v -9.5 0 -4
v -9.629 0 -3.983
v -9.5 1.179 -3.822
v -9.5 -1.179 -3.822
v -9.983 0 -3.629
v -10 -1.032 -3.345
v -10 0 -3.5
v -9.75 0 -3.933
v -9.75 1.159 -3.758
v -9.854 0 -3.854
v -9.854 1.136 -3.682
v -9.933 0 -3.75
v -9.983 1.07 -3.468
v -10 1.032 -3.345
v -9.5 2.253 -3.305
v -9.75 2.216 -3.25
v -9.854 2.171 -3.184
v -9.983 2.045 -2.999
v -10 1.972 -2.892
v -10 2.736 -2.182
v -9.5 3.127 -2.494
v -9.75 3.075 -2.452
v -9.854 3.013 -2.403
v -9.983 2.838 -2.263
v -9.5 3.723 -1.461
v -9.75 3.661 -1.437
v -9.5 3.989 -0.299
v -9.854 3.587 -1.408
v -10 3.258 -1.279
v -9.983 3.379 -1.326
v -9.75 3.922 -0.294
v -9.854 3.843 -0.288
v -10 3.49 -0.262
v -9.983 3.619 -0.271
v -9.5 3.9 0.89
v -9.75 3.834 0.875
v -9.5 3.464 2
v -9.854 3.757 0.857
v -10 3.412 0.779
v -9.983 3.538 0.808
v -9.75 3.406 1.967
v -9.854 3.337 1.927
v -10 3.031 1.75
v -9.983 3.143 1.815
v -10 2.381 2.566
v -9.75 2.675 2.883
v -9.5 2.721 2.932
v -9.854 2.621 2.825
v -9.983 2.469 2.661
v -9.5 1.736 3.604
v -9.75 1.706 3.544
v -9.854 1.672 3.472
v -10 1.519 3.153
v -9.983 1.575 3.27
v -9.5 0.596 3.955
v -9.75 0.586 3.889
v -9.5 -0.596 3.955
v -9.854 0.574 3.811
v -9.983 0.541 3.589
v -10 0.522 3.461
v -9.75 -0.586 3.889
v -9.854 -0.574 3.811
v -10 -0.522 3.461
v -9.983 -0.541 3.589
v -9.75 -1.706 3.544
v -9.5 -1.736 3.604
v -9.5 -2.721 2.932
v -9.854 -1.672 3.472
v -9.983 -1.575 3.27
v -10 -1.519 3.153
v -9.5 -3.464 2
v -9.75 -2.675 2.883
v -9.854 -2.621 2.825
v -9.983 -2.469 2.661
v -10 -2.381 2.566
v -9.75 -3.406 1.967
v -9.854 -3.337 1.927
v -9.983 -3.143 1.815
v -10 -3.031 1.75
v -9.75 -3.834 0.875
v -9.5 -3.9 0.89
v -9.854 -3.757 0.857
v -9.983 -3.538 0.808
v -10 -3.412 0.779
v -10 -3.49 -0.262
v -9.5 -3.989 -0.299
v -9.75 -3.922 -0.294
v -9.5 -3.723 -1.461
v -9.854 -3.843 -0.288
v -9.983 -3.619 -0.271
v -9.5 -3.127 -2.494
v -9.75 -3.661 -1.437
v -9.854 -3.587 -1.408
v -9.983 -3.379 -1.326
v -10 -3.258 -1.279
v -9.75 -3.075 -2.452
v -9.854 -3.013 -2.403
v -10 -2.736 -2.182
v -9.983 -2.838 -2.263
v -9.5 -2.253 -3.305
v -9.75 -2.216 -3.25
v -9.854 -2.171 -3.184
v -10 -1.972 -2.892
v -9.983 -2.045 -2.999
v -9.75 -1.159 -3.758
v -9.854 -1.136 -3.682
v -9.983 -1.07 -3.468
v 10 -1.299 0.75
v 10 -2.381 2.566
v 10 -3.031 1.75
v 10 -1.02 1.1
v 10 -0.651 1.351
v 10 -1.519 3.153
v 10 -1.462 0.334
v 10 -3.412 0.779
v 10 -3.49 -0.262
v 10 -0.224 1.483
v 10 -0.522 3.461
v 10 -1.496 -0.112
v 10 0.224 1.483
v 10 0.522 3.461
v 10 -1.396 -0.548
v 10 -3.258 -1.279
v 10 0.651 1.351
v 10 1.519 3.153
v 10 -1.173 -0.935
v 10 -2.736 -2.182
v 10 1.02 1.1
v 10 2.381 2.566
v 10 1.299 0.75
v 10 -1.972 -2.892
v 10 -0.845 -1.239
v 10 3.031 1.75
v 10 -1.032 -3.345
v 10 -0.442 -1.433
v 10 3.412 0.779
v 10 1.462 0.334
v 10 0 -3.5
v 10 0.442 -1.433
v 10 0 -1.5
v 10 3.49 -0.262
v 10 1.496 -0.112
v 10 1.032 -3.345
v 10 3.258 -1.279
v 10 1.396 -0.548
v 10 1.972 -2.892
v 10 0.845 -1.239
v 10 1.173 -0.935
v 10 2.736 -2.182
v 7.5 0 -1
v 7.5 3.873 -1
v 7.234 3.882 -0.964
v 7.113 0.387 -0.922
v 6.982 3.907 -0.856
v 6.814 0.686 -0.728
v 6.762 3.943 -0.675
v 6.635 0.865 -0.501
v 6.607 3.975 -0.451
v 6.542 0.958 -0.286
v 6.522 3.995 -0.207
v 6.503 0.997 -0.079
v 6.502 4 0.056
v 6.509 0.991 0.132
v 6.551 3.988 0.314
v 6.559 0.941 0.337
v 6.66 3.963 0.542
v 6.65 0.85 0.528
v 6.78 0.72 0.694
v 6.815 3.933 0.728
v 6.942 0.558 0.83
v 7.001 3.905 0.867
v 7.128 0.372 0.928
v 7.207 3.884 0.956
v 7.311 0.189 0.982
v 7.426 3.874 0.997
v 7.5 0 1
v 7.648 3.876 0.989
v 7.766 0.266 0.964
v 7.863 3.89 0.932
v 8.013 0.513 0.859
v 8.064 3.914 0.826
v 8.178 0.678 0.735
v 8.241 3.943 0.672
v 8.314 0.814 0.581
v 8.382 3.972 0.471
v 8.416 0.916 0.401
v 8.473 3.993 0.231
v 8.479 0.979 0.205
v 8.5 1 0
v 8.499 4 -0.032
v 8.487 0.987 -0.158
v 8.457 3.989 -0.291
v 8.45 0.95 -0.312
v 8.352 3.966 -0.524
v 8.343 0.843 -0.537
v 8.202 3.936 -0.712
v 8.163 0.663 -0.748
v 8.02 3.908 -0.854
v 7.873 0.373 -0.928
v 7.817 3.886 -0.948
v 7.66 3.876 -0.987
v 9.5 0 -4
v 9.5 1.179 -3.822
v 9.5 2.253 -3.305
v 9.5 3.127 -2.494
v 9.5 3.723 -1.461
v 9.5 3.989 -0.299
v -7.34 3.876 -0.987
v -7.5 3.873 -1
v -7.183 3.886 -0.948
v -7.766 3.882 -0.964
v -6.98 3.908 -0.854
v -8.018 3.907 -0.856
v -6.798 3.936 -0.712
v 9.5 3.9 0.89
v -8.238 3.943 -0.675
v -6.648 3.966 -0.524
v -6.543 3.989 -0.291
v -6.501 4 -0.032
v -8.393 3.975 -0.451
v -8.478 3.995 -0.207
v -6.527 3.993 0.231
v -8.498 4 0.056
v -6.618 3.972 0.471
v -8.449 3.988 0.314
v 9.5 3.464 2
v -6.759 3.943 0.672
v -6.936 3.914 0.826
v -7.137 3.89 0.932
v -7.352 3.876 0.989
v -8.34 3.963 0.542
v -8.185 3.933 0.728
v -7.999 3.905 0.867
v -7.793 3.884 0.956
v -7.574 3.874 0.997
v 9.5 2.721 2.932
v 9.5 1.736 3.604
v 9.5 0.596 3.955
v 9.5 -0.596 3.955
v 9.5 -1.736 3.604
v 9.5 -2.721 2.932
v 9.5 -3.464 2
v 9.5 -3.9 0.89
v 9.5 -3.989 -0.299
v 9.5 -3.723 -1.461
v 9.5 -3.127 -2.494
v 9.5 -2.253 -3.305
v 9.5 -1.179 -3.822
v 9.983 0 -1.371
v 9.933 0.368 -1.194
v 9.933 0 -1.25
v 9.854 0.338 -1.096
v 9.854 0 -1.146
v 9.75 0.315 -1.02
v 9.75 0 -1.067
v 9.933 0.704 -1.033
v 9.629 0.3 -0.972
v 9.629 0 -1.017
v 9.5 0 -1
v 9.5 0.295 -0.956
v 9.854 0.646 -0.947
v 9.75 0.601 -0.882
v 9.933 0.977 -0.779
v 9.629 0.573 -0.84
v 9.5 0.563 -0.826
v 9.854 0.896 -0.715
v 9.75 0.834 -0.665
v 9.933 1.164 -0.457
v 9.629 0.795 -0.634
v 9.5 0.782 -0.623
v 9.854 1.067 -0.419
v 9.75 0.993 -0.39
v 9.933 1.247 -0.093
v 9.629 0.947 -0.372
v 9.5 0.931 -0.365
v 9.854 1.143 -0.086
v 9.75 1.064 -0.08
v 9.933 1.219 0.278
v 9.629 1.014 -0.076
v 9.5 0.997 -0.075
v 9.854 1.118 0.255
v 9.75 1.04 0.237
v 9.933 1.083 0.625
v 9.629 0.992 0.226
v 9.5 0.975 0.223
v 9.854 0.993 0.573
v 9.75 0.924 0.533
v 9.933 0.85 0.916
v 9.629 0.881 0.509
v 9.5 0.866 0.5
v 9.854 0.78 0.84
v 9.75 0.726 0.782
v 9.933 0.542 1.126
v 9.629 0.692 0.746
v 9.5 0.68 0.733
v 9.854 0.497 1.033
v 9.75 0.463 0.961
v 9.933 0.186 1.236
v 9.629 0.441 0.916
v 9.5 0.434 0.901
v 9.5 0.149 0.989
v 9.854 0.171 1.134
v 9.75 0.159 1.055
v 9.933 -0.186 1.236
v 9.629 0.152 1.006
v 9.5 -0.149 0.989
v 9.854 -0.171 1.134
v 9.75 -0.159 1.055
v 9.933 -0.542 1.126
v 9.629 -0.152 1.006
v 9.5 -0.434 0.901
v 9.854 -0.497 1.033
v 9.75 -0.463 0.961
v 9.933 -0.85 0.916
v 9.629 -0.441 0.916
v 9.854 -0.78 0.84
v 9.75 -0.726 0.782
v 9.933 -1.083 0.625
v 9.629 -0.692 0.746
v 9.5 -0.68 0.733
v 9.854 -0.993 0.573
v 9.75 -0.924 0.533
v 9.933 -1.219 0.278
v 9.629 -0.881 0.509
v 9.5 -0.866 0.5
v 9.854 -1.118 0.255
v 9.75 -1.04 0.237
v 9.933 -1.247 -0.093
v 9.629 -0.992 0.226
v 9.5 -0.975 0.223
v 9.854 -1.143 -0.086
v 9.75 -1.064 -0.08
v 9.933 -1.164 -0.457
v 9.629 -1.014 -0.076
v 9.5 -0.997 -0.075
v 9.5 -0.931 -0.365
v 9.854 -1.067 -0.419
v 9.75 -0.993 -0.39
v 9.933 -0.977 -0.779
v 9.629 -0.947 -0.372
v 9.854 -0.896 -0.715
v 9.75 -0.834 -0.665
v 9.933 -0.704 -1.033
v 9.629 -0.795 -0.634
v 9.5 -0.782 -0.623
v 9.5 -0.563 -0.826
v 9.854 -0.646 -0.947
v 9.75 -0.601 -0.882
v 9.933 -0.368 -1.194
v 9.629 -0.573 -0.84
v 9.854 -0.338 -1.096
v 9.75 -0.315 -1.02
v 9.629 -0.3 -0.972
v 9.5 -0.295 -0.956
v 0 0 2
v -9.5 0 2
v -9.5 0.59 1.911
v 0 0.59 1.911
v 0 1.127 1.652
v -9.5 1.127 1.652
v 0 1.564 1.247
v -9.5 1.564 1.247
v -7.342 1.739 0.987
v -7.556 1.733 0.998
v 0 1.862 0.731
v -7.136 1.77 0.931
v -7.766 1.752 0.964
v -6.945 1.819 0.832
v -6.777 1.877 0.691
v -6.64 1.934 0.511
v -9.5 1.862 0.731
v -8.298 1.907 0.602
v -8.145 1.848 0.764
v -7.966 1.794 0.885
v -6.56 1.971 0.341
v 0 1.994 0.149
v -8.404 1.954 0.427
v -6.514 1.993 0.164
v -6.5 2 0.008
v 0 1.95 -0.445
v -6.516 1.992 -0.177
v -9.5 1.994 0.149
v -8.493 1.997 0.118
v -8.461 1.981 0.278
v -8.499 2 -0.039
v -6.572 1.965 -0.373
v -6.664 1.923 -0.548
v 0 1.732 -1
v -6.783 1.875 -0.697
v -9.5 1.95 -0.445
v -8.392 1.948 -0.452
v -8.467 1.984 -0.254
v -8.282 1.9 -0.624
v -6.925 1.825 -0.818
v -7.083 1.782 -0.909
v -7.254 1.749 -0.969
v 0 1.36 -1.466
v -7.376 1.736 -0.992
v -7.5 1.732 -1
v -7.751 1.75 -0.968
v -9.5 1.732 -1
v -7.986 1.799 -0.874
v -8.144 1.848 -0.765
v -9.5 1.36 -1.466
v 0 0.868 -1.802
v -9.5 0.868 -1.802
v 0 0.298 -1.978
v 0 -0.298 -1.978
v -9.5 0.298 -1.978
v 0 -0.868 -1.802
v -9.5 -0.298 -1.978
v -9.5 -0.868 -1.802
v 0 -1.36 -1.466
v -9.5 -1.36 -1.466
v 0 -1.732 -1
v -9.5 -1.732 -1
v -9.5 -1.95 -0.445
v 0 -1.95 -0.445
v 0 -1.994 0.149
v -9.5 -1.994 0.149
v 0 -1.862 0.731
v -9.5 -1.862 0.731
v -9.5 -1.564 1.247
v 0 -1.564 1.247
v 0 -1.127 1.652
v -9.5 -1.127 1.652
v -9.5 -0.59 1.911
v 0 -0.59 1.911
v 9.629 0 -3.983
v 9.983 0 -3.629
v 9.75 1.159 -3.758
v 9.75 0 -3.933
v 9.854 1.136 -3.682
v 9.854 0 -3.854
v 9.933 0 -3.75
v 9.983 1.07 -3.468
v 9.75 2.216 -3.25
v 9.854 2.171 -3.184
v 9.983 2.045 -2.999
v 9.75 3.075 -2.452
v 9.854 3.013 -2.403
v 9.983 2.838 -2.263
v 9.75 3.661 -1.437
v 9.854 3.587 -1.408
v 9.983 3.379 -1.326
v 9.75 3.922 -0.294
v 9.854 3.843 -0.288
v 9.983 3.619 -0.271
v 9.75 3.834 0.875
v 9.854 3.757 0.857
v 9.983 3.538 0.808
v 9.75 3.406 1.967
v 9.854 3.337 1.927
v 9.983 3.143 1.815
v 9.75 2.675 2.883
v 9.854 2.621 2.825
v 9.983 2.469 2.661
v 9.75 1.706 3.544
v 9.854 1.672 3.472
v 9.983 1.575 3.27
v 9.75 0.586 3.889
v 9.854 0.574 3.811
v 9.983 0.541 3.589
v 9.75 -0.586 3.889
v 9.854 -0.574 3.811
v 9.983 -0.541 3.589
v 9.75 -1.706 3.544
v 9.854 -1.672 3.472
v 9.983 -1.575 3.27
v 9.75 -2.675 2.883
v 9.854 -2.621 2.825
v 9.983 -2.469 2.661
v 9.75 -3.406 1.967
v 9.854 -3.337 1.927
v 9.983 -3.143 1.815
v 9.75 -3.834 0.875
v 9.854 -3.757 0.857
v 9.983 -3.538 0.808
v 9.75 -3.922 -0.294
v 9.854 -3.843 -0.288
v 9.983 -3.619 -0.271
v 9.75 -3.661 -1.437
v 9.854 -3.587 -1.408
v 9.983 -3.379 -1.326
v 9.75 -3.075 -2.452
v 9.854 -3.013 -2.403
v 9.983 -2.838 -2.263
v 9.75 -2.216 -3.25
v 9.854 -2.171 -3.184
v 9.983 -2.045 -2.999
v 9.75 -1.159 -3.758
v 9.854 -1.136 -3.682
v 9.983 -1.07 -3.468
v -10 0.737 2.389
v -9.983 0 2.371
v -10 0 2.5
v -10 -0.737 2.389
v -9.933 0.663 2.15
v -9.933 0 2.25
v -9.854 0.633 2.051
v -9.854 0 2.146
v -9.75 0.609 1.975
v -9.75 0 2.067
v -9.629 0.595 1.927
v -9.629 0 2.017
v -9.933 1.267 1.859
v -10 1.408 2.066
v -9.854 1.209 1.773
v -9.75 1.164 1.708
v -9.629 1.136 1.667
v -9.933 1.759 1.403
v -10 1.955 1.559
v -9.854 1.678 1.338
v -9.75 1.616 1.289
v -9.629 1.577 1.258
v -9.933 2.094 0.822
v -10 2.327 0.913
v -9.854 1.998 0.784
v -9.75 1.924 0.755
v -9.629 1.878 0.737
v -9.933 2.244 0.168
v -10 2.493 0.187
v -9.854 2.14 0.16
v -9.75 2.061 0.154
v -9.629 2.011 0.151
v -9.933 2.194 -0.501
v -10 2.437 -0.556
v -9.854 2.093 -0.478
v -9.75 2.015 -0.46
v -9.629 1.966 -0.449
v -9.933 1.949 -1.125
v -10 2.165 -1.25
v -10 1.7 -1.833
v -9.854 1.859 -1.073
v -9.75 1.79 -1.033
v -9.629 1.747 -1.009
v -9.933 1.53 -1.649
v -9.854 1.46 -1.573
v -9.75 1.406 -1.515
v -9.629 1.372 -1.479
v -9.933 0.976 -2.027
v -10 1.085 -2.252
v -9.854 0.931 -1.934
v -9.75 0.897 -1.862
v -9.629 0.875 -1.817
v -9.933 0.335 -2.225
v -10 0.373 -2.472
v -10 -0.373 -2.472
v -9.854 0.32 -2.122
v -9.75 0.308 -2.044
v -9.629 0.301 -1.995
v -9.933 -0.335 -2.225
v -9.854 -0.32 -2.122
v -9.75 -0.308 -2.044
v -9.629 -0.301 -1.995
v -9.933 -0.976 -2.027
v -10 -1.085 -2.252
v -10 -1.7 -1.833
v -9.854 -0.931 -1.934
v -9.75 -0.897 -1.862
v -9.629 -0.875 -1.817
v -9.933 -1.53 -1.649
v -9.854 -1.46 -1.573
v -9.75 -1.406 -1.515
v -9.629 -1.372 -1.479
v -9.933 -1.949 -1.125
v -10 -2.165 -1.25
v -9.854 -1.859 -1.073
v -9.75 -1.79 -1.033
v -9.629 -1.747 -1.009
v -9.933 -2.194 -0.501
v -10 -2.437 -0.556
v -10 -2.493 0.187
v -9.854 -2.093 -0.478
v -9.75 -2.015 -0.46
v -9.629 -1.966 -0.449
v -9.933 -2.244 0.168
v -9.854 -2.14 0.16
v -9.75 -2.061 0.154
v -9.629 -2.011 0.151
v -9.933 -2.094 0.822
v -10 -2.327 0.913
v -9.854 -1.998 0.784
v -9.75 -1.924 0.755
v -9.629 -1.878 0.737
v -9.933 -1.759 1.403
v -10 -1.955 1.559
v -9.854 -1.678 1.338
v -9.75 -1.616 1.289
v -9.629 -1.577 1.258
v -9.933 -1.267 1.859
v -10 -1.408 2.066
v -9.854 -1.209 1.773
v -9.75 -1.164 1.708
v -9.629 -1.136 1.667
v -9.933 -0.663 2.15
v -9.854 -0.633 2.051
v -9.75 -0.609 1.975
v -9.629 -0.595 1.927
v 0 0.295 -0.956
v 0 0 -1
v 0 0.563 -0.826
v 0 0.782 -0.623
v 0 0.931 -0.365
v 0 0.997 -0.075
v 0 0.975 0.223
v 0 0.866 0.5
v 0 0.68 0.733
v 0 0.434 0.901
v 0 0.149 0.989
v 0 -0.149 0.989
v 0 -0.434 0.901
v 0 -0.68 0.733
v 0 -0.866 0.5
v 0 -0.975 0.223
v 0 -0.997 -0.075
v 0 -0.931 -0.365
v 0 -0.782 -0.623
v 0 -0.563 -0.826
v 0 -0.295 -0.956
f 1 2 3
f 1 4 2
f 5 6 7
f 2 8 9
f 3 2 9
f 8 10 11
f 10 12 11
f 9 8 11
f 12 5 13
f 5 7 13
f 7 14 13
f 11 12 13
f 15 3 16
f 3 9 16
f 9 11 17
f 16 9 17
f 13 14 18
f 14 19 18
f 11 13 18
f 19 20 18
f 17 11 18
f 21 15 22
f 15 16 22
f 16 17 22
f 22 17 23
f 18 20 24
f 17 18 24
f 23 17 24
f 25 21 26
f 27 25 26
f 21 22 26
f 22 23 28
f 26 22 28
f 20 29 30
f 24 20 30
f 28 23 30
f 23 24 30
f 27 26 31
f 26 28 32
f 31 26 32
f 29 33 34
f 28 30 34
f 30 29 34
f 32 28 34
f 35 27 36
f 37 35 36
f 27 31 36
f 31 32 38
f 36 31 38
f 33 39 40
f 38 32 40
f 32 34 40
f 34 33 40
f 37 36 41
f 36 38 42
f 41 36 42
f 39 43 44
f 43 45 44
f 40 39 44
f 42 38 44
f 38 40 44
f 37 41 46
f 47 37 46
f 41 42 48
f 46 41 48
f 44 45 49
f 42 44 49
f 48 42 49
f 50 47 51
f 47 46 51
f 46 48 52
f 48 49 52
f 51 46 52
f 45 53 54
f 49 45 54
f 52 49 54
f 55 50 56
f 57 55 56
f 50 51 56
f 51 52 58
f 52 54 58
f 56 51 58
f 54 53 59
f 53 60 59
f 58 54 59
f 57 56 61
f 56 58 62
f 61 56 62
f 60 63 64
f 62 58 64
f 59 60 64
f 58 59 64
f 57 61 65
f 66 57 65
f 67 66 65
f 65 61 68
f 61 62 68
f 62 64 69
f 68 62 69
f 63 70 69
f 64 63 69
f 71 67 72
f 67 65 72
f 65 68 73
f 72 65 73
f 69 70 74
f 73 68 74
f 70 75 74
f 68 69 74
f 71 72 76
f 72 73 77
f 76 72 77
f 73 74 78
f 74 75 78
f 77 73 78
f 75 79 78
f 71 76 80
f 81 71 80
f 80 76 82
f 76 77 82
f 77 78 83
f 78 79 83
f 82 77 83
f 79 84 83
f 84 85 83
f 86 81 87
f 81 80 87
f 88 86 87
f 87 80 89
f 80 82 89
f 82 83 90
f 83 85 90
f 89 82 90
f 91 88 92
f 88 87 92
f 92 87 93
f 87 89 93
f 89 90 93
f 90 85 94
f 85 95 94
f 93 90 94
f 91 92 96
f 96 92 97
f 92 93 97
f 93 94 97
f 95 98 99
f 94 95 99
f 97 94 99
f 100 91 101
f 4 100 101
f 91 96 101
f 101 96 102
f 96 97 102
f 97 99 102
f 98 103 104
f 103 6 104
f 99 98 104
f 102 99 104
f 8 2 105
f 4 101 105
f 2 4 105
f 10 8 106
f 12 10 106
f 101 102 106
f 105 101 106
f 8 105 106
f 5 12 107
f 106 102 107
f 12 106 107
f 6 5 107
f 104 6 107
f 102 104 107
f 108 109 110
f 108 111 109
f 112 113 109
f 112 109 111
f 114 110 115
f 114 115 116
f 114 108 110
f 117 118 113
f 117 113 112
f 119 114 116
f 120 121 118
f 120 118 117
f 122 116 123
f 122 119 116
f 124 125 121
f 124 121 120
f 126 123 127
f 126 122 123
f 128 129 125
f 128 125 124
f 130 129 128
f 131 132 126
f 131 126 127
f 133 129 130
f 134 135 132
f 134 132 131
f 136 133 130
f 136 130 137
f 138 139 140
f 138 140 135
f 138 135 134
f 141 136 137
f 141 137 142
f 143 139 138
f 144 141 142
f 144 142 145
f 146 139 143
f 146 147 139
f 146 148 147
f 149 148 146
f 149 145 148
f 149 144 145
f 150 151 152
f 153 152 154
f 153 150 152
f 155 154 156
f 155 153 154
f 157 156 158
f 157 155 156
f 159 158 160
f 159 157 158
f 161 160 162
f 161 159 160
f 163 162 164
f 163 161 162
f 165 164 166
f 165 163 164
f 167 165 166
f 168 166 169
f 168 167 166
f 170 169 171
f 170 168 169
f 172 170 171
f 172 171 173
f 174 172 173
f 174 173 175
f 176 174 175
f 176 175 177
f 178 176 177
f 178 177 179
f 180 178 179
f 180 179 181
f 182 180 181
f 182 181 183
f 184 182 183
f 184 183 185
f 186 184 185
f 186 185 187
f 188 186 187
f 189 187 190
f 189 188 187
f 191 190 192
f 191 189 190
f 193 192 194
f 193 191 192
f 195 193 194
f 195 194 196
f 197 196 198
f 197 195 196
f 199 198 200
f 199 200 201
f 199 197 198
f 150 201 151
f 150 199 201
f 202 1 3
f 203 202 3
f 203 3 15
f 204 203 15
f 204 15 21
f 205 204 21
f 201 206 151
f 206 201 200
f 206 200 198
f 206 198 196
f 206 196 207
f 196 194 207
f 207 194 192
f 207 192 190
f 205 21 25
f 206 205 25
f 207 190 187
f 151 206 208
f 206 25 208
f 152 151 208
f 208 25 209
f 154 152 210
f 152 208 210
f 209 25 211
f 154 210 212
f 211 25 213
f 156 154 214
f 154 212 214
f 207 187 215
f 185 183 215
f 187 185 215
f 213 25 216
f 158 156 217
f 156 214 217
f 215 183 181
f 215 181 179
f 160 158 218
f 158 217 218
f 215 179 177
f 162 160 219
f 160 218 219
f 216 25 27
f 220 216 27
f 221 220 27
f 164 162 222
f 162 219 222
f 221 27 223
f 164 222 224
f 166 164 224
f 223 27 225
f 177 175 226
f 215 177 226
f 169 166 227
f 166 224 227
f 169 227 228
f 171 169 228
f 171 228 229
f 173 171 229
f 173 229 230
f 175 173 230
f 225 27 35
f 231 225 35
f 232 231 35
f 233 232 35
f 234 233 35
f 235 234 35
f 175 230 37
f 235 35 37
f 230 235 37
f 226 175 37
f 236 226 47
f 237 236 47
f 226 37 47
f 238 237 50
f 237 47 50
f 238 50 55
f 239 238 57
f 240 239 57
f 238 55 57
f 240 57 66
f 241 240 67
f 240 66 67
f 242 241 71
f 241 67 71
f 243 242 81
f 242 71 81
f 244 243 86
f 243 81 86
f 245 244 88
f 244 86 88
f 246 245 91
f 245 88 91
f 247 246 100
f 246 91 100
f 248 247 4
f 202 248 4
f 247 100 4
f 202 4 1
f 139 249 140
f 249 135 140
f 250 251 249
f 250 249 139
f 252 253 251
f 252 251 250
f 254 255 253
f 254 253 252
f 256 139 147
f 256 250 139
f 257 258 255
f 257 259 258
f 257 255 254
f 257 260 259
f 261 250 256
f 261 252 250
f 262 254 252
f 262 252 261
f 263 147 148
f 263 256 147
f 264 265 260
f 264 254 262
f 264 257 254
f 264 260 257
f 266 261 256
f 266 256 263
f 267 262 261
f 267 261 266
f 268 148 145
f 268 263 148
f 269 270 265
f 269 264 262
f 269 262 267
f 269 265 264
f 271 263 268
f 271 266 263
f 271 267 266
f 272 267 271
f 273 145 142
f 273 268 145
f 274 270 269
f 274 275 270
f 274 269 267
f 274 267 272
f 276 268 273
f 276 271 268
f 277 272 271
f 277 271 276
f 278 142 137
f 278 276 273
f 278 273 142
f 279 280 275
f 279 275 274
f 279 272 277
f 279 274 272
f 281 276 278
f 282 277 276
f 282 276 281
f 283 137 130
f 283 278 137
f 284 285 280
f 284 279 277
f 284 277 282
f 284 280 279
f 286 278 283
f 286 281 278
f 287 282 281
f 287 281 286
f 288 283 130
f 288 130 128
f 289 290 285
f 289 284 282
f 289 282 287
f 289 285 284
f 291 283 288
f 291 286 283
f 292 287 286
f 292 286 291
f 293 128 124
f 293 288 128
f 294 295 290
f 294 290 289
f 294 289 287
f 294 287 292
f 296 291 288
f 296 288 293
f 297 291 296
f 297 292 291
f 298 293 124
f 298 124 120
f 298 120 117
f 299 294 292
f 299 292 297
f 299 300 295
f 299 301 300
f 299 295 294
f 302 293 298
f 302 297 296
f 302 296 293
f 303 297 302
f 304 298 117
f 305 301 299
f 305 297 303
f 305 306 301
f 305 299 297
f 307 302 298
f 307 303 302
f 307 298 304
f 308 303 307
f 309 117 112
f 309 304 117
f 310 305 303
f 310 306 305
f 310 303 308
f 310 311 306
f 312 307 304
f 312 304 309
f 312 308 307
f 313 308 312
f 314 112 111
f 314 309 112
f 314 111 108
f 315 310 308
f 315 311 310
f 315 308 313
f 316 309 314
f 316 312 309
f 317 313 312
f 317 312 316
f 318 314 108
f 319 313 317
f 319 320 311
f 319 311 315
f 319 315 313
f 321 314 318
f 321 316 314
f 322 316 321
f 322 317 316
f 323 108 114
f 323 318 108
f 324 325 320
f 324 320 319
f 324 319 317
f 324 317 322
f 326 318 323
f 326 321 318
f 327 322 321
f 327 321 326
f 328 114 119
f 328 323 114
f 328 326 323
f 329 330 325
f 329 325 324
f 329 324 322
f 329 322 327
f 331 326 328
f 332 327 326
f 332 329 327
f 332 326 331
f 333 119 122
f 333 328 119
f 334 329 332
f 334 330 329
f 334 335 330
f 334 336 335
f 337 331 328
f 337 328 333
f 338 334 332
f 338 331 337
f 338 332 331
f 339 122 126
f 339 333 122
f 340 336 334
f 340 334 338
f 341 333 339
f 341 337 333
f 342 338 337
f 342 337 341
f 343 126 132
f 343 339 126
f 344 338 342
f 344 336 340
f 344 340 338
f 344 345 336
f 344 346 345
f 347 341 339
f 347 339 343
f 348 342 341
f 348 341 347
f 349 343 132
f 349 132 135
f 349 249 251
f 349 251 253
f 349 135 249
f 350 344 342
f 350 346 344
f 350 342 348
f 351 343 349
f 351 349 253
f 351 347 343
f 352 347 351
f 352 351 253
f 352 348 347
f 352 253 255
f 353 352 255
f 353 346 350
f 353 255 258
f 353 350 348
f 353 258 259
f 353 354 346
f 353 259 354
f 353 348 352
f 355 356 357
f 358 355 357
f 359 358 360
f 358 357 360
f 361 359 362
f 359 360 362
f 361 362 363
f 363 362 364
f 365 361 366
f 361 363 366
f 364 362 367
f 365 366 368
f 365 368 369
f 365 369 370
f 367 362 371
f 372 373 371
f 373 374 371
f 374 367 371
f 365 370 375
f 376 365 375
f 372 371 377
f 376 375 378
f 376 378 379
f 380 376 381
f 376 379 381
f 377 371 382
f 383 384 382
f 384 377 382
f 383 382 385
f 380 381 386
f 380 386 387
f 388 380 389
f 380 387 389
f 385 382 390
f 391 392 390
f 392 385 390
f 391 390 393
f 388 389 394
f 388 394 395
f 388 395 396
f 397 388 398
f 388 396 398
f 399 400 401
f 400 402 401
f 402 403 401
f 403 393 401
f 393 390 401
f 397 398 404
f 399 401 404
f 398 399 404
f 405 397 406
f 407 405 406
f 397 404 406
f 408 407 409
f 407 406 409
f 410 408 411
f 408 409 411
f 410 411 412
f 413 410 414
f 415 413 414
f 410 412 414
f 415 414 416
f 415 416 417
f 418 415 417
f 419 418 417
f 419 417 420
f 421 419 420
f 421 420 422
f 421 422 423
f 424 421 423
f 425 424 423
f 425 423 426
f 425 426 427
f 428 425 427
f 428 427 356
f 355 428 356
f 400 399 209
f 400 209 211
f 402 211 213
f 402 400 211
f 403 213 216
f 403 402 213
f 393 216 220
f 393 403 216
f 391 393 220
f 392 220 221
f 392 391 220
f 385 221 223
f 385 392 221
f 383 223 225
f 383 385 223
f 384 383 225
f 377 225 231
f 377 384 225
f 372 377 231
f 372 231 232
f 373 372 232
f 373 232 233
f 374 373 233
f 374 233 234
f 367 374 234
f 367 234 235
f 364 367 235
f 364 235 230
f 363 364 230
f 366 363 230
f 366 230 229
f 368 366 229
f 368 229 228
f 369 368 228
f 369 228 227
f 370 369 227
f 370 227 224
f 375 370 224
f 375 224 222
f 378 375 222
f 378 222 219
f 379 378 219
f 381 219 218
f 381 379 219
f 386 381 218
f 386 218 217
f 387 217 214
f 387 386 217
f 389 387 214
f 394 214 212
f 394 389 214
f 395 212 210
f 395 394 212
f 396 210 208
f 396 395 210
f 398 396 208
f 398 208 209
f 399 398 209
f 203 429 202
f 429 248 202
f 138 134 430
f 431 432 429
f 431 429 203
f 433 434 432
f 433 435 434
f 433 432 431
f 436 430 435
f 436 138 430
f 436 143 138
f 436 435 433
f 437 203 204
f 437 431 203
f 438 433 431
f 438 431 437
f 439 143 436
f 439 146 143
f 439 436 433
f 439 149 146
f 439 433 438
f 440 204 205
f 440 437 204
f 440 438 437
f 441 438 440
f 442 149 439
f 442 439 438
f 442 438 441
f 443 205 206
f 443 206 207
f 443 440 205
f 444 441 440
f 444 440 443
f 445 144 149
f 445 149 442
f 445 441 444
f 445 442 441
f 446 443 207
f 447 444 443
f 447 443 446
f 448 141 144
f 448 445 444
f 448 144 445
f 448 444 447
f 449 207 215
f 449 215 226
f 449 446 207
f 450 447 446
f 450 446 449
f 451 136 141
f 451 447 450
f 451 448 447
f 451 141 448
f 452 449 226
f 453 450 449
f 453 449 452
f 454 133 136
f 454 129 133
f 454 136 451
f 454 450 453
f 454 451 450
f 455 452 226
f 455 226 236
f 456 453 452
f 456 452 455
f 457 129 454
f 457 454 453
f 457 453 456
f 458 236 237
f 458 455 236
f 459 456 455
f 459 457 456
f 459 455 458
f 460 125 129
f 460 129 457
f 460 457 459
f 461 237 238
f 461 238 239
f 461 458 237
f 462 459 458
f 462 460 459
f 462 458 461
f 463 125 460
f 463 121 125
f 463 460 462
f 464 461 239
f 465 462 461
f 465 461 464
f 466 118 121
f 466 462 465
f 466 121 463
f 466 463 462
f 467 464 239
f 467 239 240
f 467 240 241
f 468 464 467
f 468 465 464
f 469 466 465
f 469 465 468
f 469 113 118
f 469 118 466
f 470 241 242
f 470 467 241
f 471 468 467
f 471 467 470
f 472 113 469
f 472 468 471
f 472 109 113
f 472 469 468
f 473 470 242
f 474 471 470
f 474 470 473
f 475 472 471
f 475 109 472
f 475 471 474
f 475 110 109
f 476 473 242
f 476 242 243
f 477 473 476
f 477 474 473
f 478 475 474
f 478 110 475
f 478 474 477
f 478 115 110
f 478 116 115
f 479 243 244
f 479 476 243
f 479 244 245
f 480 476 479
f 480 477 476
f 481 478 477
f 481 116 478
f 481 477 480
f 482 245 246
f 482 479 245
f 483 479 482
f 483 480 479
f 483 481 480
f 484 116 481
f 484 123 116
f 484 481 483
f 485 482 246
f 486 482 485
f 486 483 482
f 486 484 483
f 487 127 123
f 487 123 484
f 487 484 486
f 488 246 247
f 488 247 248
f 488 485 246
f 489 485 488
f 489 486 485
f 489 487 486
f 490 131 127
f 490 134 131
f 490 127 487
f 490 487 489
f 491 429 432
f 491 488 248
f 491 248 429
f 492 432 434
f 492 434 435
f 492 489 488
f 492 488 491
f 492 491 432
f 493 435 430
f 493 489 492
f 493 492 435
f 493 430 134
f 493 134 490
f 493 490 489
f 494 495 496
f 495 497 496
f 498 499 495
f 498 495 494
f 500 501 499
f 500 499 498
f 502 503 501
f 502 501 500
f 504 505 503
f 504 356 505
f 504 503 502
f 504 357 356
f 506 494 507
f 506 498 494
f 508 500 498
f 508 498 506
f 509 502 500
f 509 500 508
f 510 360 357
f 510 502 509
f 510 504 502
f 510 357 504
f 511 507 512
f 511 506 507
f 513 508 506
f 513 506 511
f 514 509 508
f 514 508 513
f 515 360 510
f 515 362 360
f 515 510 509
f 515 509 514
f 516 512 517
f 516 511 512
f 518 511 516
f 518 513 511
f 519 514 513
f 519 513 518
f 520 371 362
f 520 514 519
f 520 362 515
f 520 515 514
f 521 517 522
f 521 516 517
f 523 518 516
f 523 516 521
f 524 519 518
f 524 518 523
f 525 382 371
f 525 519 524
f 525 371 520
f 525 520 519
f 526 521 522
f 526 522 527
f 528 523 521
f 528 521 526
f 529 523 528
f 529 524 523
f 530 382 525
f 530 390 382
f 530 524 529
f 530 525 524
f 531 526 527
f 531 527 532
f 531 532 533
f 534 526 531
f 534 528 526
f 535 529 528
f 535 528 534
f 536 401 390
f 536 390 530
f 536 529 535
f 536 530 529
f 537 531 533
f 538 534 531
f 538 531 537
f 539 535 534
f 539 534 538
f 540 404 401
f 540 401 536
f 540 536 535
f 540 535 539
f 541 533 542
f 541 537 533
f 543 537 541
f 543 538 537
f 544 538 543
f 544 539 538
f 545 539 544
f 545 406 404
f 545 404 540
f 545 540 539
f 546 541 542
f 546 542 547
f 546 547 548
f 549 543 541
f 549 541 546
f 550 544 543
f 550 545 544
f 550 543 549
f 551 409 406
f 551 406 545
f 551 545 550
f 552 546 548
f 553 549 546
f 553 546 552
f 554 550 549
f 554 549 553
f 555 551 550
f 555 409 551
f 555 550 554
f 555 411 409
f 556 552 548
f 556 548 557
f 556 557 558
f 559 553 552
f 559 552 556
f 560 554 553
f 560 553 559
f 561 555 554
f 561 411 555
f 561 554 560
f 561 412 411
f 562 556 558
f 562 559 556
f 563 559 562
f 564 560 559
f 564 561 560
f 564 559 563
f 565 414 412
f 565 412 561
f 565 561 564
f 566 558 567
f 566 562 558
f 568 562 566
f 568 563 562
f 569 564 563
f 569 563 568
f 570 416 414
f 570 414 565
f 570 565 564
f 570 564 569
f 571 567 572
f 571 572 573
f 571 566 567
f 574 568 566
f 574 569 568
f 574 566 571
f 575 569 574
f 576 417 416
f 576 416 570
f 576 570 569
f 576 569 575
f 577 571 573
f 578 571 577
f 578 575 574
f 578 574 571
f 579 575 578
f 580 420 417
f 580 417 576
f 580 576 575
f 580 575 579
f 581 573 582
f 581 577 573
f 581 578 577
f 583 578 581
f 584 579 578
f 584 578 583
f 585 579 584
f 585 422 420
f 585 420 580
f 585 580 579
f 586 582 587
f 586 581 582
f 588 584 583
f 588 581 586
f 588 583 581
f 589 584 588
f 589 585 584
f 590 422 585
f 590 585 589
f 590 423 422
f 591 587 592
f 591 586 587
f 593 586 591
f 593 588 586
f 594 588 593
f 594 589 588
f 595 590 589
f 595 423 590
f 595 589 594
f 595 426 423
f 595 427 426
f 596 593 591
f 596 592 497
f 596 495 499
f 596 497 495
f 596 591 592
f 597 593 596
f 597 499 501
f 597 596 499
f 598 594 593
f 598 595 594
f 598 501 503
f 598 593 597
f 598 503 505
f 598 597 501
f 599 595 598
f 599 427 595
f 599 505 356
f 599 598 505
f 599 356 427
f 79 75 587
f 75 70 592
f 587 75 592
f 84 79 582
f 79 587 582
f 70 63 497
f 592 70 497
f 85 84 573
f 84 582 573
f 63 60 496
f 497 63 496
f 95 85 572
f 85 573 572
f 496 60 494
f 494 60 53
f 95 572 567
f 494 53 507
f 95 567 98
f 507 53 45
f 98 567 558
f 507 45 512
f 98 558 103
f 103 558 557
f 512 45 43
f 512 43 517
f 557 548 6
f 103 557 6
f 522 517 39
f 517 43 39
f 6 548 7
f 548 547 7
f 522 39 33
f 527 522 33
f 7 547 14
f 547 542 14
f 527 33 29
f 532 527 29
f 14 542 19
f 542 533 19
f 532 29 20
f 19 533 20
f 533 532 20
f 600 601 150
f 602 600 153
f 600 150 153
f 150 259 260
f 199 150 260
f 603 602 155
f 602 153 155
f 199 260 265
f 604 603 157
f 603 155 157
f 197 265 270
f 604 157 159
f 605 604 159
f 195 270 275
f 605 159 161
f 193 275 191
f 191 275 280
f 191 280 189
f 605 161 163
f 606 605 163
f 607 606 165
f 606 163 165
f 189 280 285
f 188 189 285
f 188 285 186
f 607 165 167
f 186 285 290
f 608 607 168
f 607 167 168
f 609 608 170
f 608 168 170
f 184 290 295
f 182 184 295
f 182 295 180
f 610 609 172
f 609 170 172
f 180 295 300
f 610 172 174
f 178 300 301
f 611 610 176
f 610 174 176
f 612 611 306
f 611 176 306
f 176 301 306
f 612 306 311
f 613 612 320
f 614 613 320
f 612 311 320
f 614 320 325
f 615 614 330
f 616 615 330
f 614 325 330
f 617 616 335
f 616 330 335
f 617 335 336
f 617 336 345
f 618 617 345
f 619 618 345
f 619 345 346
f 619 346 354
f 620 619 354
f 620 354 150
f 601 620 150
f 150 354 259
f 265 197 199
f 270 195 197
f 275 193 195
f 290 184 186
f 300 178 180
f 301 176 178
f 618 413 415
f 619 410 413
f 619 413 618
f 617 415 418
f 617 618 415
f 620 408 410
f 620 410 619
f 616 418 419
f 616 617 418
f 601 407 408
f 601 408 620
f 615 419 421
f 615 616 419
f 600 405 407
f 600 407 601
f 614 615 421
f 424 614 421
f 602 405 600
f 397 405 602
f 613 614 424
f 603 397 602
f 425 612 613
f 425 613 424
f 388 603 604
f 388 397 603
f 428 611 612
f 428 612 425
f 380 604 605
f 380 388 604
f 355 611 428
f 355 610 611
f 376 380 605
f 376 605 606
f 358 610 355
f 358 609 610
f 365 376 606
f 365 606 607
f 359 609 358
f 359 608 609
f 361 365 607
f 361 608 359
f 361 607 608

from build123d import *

# Parameters (mm, degrees)
BOSS_EXTRUDE1_DEPTH      = 10
BOSS_EXTRUDE1_DEPTH_BACK = 10
SKETCH1_R                = 4
SKETCH2_R                = 1
CUT_EXTRUDE1_DEPTH       = 10
SKETCH3_R                = 2
CUT_EXTRUDE2_DEPTH       = 10
CUT_EXTRUDE4_REACH       = 13.489
CUT_EXTRUDE4_END_RADIUS  = 4
SKETCH4_R                = 1
FILLET1_R                = 0.5


with BuildPart() as part:
    # Sketch1 → Boss-Extrude1 (new, two sides: drawn at the far end of the back side and taken through both)
    with BuildSketch(Plane(origin=(0, 0, 0), x_dir=(0, 0, -1), z_dir=(1, 0, 0)).offset(-BOSS_EXTRUDE1_DEPTH_BACK)):
        Circle(SKETCH1_R)
    extrude(amount=BOSS_EXTRUDE1_DEPTH + BOSS_EXTRUDE1_DEPTH_BACK)

    # Sketch2 → Cut-Extrude1 (cut)
    with BuildSketch(Plane(origin=(10, 0, 0), x_dir=(0, 0, -1), z_dir=(1, 0, 0))):
        Circle(SKETCH2_R)
    extrude(amount=-CUT_EXTRUDE1_DEPTH, mode=Mode.SUBTRACT)

    # Sketch3 → Cut-Extrude2 (cut)
    with BuildSketch(Plane.ZY.offset(10)):
        Circle(SKETCH3_R)
    extrude(amount=-CUT_EXTRUDE2_DEPTH, mode=Mode.SUBTRACT)

    # Cut-Extrude4: up to this cylinder (the profile starts inside it)
    cut_extrude4_end = Plane(origin=(0, 0, 0), z_dir=(1, 0, 0)) * Cylinder(CUT_EXTRUDE4_END_RADIUS, 50.978, mode=Mode.PRIVATE)
    # Sketch4 → Cut-Extrude4 (cut, up to the surface)
    with BuildSketch(Plane(origin=(0, 0, 0), x_dir=(1, 0, 0), z_dir=(0, 1, 0)), mode=Mode.PRIVATE) as cut_extrude4_sk1:
        with Locations(Location((-7.5, 0, 0), (0, 0, 90))):
            Circle(SKETCH4_R)
    cut_extrude4_tool1 = extrude(cut_extrude4_sk1.sketch, amount=CUT_EXTRUDE4_REACH, mode=Mode.PRIVATE) & cut_extrude4_end
    add(cut_extrude4_tool1.solids().sort_by_distance((-7.5, 0, 0))[0], mode=Mode.SUBTRACT)
    # Sketch4 → Cut-Extrude4 (cut, up to the surface)
    with BuildSketch(Plane(origin=(0, 0, 0), x_dir=(1, 0, 0), z_dir=(0, 1, 0)), mode=Mode.PRIVATE) as cut_extrude4_sk2:
        with Locations(Location((7.5, 0, 0), (0, 0, 90))):
            Circle(SKETCH4_R)
    cut_extrude4_tool2 = extrude(cut_extrude4_sk2.sketch, amount=CUT_EXTRUDE4_REACH, mode=Mode.PRIVATE) & cut_extrude4_end
    add(cut_extrude4_tool2.solids().sort_by_distance((7.5, 0, 0))[0], mode=Mode.SUBTRACT)

    # Fillet1
    fillet1_edges = [part.edges().sort_by_distance(p)[0] for p in [
        (-10, 0, -2),
        (-10, 0, 4),
        (10, 0, 4),
        (10, 0, 1),
    ]]
    fillet(fillet1_edges, radius=FILLET1_R)


solid = part.part
